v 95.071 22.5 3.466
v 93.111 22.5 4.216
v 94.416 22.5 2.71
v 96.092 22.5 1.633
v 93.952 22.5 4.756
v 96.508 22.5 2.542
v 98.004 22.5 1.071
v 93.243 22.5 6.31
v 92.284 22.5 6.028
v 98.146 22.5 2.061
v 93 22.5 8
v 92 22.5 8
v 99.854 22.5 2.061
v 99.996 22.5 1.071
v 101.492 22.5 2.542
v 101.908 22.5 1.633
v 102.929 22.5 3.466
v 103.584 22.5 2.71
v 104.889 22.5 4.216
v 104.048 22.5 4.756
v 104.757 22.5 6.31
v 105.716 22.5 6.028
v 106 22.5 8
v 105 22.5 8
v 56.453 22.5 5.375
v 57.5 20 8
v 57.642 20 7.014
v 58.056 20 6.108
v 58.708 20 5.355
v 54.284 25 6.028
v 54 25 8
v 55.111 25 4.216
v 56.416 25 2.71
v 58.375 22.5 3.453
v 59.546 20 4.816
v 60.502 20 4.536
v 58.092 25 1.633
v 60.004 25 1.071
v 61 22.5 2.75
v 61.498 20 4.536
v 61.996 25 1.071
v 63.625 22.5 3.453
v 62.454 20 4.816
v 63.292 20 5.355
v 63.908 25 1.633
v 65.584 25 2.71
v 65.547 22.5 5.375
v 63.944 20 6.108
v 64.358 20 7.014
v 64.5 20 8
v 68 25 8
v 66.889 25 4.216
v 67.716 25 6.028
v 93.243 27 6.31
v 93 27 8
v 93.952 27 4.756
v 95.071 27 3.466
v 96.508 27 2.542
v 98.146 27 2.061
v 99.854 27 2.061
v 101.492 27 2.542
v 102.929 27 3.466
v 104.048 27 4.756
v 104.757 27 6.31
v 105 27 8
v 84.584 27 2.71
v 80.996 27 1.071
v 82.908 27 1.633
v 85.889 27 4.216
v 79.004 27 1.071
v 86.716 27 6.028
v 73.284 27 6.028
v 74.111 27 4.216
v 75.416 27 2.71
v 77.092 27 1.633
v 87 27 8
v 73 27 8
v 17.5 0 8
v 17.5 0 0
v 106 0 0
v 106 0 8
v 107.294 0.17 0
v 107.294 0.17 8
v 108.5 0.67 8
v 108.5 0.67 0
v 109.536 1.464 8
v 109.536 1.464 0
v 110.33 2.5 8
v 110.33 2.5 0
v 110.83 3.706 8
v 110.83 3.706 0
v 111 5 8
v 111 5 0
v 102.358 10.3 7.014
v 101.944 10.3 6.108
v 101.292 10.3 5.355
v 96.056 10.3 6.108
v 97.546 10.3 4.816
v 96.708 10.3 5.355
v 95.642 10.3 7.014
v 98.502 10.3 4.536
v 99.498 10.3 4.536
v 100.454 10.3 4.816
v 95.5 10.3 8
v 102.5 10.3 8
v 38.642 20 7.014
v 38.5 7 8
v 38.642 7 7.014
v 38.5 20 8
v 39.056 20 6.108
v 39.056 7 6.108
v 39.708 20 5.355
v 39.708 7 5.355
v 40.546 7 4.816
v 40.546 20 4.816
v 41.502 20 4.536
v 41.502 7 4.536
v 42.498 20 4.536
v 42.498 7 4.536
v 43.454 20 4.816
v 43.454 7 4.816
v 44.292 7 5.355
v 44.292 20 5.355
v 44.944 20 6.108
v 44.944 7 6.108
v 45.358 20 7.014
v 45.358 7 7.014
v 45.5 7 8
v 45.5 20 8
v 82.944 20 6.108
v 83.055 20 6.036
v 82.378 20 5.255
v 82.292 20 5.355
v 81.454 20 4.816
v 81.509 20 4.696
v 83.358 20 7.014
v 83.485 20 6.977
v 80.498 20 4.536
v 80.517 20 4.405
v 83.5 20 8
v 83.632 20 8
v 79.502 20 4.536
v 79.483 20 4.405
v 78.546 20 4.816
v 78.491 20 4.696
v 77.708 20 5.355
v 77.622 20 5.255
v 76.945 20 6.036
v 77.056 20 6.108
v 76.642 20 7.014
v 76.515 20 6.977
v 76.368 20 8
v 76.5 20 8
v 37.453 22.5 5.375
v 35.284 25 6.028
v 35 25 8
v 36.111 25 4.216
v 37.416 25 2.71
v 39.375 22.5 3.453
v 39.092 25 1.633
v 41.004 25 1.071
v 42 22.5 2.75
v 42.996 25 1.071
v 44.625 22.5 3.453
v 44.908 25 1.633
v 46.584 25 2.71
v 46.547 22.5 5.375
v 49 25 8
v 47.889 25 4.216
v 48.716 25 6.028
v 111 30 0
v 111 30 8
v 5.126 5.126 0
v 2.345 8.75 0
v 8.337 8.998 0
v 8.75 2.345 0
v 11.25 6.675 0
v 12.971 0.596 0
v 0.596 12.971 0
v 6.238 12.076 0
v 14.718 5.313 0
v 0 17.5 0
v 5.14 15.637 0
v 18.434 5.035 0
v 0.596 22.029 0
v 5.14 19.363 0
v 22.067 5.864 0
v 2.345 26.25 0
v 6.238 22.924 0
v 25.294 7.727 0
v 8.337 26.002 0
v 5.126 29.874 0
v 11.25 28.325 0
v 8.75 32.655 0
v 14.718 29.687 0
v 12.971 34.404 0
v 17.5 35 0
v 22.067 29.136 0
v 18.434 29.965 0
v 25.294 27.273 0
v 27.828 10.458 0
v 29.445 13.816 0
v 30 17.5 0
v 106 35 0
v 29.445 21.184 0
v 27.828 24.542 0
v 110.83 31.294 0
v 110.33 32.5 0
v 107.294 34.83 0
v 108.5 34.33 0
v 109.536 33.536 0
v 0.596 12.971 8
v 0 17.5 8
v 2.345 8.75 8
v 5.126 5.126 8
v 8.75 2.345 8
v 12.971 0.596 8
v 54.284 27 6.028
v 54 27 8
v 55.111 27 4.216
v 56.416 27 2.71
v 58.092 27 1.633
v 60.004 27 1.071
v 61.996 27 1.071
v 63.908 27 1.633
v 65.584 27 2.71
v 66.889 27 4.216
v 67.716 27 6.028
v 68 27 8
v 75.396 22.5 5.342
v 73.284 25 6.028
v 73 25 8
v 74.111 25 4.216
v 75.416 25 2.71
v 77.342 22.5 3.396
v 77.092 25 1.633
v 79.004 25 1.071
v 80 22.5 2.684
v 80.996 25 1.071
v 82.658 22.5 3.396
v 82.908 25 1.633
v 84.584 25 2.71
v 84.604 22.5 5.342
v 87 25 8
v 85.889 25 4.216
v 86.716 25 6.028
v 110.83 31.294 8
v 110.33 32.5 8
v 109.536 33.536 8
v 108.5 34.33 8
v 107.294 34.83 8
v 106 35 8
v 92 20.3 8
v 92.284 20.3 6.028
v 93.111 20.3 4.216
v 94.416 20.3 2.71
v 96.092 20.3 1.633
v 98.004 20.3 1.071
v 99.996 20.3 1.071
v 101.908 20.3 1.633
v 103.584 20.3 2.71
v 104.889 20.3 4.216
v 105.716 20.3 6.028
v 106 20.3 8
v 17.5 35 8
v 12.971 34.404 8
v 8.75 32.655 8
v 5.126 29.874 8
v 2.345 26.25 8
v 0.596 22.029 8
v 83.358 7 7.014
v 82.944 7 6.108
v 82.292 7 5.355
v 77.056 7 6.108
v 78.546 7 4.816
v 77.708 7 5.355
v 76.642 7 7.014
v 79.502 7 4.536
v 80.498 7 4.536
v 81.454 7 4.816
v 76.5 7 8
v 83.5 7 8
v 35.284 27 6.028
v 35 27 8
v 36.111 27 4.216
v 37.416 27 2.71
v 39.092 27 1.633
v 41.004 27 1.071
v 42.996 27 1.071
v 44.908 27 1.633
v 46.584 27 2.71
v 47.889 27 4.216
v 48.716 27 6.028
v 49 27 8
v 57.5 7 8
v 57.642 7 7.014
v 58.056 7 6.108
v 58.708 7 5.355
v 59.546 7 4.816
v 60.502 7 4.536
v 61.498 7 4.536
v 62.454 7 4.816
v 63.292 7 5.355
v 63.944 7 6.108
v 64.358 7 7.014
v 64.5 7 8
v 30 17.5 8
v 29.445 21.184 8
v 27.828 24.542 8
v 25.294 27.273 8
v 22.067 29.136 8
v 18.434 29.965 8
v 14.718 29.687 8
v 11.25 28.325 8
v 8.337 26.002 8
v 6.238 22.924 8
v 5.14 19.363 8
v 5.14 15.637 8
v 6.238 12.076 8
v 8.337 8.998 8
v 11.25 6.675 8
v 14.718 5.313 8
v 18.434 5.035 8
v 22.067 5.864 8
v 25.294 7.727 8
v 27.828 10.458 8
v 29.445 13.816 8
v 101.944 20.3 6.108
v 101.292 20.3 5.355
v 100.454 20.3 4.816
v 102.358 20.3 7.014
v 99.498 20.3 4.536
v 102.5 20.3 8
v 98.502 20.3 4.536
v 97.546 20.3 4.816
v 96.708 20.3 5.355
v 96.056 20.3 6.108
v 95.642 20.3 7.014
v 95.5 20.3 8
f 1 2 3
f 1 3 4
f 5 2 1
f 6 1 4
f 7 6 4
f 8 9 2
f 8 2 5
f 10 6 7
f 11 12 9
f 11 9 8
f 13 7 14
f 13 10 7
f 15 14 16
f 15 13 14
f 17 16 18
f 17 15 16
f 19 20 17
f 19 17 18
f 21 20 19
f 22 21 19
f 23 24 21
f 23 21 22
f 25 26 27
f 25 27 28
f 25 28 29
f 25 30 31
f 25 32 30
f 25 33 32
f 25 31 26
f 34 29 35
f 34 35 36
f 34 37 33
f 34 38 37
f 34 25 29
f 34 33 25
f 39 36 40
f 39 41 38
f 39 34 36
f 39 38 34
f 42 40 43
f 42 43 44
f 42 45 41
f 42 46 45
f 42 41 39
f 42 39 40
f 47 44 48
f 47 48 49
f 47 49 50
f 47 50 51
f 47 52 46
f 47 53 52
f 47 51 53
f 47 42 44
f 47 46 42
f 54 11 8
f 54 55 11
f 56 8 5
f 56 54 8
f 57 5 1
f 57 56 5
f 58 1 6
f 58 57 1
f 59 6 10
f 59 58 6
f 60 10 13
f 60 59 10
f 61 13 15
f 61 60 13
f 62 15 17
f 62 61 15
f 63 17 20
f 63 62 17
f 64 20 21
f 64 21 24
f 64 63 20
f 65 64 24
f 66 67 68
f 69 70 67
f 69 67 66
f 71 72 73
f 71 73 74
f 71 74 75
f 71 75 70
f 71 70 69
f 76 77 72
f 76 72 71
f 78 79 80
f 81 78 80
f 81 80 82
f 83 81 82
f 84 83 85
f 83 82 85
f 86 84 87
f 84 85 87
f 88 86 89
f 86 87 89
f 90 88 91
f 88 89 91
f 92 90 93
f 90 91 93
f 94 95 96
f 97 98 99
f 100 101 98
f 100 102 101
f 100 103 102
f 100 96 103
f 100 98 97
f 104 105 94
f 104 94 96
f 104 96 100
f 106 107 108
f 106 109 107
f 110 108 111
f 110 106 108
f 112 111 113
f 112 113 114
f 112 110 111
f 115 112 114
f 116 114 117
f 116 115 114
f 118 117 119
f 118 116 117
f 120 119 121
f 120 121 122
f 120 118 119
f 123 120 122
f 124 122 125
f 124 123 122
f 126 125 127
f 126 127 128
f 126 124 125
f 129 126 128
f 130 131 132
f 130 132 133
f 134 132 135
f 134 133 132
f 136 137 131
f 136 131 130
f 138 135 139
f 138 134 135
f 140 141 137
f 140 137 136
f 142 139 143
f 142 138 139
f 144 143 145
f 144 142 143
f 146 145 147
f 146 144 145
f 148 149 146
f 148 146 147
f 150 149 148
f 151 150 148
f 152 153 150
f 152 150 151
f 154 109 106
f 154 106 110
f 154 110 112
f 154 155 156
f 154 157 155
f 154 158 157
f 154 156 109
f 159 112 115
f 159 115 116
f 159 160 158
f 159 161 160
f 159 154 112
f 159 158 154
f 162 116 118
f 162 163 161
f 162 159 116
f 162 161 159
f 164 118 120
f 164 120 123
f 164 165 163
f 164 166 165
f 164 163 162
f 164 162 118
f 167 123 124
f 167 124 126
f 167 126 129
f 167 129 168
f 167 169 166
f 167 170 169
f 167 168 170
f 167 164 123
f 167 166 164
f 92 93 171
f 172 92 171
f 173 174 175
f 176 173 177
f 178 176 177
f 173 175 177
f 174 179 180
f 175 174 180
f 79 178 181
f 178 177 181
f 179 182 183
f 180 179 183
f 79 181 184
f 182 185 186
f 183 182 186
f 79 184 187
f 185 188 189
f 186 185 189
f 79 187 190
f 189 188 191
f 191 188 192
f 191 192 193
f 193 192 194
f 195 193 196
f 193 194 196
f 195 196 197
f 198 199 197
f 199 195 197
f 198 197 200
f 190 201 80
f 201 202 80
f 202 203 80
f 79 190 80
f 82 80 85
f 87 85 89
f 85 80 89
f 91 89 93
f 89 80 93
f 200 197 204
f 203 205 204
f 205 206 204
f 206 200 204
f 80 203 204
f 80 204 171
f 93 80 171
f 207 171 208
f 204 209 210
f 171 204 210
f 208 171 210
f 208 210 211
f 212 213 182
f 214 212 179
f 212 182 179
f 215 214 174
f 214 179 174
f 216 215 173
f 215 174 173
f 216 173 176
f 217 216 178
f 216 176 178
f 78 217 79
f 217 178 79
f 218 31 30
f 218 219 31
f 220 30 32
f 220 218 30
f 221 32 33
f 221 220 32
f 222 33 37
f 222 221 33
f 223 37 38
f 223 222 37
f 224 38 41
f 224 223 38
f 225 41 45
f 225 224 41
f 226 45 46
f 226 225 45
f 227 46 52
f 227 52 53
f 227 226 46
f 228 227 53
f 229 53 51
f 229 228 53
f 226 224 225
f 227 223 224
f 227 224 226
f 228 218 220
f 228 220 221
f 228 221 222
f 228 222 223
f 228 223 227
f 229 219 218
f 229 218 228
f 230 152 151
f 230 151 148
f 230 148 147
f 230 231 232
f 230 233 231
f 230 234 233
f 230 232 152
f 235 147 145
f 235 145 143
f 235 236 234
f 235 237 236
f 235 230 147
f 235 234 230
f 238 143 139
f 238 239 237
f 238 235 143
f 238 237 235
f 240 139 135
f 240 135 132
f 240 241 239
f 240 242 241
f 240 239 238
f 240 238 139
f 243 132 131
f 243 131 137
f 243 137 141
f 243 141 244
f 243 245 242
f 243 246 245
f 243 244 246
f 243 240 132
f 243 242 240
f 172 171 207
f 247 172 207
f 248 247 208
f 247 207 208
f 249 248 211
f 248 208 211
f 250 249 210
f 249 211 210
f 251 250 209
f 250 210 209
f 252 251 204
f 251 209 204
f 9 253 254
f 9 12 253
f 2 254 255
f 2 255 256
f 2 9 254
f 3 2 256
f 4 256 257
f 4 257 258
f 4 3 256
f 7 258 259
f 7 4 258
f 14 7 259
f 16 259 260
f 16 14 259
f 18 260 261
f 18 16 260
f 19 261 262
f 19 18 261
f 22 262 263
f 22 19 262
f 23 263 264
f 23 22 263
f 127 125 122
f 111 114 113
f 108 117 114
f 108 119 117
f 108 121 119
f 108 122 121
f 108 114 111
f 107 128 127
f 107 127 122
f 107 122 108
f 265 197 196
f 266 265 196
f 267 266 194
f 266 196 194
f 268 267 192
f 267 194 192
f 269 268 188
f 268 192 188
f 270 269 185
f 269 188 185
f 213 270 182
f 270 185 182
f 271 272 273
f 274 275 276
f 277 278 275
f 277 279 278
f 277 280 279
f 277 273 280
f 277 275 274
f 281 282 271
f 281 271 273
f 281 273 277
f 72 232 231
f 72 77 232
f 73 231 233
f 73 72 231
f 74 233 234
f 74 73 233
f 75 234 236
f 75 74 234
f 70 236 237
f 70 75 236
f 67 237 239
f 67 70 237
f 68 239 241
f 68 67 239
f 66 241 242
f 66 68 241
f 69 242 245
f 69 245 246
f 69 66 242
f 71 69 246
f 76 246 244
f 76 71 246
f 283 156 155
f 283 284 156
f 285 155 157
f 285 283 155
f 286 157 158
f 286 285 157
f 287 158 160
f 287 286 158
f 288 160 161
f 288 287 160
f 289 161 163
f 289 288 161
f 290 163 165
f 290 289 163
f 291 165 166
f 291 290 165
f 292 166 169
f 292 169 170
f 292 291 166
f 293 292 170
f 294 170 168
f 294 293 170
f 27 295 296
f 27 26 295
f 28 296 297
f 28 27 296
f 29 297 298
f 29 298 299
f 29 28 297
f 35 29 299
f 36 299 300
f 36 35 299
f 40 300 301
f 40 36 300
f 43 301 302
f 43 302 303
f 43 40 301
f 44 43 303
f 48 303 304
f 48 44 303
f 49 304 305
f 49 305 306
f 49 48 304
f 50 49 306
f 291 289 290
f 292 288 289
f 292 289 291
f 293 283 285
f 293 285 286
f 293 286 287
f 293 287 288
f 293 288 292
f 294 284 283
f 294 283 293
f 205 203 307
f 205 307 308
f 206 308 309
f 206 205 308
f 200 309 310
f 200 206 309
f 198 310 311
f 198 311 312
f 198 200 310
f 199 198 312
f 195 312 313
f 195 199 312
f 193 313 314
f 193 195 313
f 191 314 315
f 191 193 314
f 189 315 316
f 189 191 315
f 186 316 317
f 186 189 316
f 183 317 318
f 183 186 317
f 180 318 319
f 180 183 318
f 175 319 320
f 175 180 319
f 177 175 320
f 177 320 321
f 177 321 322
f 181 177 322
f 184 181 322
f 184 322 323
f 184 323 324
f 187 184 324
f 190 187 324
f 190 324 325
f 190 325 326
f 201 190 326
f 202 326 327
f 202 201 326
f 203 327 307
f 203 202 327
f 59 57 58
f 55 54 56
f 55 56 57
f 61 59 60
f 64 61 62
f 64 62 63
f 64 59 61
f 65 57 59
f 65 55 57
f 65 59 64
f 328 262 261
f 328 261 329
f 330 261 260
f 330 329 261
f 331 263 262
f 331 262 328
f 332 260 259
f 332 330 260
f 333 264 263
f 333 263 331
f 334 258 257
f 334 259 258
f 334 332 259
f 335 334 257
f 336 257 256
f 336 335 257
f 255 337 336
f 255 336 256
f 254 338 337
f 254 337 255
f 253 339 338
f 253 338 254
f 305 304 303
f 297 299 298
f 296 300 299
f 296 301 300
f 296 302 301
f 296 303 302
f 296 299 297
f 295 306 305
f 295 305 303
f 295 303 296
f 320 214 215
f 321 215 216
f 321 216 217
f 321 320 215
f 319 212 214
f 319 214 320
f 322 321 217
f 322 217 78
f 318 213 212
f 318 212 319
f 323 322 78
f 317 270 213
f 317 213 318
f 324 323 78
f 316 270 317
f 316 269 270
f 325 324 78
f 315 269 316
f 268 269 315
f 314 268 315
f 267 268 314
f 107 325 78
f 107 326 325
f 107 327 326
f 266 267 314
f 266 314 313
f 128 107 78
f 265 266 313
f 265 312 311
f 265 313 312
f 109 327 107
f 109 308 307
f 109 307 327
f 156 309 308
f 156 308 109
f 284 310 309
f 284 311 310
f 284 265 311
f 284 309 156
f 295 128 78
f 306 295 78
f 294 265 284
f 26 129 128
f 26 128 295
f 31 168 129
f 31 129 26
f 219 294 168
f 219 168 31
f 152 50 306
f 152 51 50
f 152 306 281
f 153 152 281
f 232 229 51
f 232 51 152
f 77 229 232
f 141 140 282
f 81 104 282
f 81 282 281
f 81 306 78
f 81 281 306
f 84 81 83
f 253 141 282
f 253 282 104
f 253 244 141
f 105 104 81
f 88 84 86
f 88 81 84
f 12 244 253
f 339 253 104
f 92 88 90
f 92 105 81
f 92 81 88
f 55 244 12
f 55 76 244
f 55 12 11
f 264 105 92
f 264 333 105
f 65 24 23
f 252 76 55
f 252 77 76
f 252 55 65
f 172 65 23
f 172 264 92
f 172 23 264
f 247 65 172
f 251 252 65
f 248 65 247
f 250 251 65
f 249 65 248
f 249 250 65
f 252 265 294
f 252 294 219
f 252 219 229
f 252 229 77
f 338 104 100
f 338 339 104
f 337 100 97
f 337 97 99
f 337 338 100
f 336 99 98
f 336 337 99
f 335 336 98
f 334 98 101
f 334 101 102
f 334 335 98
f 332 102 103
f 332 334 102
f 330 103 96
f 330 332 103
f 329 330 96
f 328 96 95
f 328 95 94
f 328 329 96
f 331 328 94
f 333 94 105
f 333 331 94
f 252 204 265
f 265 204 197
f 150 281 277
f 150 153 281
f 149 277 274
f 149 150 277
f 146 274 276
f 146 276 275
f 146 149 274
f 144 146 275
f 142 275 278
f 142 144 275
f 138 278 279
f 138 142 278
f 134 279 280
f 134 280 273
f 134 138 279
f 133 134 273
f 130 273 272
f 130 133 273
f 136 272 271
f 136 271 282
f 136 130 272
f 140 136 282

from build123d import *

# Parameters (mm, degrees)
F0_R     = 12.5
F1_DEPTH = 8


with BuildPart() as f1:
    # F0 (on Top) → F1 (new body)
    with BuildSketch(Plane.XY):
        with BuildLine():
            ThreePointArc((0, 17.5), (5.125631, 5.125631), (17.5, 0))
            Line((17.5, 0), (106, 0))
            ThreePointArc((106, 0), (109.535534, 1.464466), (111, 5))
            Line((111, 5), (111, 30))
            ThreePointArc((111, 30), (109.535534, 33.535534), (106, 35))
            Line((106, 35), (17.5, 35))
            ThreePointArc((17.5, 35), (5.125631, 29.874369), (0, 17.5))
        make_face()
        with Locations((17.5, 17.5)):
            Circle(F0_R, mode=Mode.SUBTRACT)
    extrude(amount=F1_DEPTH)

    # F2 (on face) → F3 (revolve, cut)
    with BuildSketch(Plane.XY.offset(8)):
        Polygon((105, 27), (99, 27), (99, 22.5), (99, 20.3), (99, 10.3), (102.5, 10.3), (102.5, 20.3), (106, 20.3), (106, 22.5), (105, 22.5), align=None)
    revolve(axis=Axis((99, 15.3, 8), (0, -1, 0)), mode=Mode.SUBTRACT)

    # F2 (on face) → F4 (revolve, cut)
    with BuildSketch(Plane.XY.offset(8)):
        Polygon((87, 27), (80, 27), (80, 25), (80, 20), (80, 7), (83.5, 7), (83.5, 20), (83.63197, 20), (87, 25), align=None)
    revolve(axis=Axis((80, 13.5, 8), (0, -1, 0)), mode=Mode.SUBTRACT)

    # F2 (on face) → F5 (revolve, cut)
    with BuildSketch(Plane.XY.offset(8)):
        Polygon((68, 27), (61, 27), (61, 25), (61, 20), (61, 7), (64.5, 7), (64.5, 20), (68, 25), align=None)
    revolve(axis=Axis((61, 13.5, 8), (0, -1, 0)), mode=Mode.SUBTRACT)

    # F2 (on face) → F6 (revolve, cut)
    with BuildSketch(Plane.XY.offset(8)):
        Polygon((49, 27), (42, 27), (42, 25), (42, 20), (42, 7), (45.5, 7), (45.5, 20), (49, 25), align=None)
    revolve(axis=Axis((42, 13.5, 8), (0, -1, 0)), mode=Mode.SUBTRACT)


solid = f1.part
